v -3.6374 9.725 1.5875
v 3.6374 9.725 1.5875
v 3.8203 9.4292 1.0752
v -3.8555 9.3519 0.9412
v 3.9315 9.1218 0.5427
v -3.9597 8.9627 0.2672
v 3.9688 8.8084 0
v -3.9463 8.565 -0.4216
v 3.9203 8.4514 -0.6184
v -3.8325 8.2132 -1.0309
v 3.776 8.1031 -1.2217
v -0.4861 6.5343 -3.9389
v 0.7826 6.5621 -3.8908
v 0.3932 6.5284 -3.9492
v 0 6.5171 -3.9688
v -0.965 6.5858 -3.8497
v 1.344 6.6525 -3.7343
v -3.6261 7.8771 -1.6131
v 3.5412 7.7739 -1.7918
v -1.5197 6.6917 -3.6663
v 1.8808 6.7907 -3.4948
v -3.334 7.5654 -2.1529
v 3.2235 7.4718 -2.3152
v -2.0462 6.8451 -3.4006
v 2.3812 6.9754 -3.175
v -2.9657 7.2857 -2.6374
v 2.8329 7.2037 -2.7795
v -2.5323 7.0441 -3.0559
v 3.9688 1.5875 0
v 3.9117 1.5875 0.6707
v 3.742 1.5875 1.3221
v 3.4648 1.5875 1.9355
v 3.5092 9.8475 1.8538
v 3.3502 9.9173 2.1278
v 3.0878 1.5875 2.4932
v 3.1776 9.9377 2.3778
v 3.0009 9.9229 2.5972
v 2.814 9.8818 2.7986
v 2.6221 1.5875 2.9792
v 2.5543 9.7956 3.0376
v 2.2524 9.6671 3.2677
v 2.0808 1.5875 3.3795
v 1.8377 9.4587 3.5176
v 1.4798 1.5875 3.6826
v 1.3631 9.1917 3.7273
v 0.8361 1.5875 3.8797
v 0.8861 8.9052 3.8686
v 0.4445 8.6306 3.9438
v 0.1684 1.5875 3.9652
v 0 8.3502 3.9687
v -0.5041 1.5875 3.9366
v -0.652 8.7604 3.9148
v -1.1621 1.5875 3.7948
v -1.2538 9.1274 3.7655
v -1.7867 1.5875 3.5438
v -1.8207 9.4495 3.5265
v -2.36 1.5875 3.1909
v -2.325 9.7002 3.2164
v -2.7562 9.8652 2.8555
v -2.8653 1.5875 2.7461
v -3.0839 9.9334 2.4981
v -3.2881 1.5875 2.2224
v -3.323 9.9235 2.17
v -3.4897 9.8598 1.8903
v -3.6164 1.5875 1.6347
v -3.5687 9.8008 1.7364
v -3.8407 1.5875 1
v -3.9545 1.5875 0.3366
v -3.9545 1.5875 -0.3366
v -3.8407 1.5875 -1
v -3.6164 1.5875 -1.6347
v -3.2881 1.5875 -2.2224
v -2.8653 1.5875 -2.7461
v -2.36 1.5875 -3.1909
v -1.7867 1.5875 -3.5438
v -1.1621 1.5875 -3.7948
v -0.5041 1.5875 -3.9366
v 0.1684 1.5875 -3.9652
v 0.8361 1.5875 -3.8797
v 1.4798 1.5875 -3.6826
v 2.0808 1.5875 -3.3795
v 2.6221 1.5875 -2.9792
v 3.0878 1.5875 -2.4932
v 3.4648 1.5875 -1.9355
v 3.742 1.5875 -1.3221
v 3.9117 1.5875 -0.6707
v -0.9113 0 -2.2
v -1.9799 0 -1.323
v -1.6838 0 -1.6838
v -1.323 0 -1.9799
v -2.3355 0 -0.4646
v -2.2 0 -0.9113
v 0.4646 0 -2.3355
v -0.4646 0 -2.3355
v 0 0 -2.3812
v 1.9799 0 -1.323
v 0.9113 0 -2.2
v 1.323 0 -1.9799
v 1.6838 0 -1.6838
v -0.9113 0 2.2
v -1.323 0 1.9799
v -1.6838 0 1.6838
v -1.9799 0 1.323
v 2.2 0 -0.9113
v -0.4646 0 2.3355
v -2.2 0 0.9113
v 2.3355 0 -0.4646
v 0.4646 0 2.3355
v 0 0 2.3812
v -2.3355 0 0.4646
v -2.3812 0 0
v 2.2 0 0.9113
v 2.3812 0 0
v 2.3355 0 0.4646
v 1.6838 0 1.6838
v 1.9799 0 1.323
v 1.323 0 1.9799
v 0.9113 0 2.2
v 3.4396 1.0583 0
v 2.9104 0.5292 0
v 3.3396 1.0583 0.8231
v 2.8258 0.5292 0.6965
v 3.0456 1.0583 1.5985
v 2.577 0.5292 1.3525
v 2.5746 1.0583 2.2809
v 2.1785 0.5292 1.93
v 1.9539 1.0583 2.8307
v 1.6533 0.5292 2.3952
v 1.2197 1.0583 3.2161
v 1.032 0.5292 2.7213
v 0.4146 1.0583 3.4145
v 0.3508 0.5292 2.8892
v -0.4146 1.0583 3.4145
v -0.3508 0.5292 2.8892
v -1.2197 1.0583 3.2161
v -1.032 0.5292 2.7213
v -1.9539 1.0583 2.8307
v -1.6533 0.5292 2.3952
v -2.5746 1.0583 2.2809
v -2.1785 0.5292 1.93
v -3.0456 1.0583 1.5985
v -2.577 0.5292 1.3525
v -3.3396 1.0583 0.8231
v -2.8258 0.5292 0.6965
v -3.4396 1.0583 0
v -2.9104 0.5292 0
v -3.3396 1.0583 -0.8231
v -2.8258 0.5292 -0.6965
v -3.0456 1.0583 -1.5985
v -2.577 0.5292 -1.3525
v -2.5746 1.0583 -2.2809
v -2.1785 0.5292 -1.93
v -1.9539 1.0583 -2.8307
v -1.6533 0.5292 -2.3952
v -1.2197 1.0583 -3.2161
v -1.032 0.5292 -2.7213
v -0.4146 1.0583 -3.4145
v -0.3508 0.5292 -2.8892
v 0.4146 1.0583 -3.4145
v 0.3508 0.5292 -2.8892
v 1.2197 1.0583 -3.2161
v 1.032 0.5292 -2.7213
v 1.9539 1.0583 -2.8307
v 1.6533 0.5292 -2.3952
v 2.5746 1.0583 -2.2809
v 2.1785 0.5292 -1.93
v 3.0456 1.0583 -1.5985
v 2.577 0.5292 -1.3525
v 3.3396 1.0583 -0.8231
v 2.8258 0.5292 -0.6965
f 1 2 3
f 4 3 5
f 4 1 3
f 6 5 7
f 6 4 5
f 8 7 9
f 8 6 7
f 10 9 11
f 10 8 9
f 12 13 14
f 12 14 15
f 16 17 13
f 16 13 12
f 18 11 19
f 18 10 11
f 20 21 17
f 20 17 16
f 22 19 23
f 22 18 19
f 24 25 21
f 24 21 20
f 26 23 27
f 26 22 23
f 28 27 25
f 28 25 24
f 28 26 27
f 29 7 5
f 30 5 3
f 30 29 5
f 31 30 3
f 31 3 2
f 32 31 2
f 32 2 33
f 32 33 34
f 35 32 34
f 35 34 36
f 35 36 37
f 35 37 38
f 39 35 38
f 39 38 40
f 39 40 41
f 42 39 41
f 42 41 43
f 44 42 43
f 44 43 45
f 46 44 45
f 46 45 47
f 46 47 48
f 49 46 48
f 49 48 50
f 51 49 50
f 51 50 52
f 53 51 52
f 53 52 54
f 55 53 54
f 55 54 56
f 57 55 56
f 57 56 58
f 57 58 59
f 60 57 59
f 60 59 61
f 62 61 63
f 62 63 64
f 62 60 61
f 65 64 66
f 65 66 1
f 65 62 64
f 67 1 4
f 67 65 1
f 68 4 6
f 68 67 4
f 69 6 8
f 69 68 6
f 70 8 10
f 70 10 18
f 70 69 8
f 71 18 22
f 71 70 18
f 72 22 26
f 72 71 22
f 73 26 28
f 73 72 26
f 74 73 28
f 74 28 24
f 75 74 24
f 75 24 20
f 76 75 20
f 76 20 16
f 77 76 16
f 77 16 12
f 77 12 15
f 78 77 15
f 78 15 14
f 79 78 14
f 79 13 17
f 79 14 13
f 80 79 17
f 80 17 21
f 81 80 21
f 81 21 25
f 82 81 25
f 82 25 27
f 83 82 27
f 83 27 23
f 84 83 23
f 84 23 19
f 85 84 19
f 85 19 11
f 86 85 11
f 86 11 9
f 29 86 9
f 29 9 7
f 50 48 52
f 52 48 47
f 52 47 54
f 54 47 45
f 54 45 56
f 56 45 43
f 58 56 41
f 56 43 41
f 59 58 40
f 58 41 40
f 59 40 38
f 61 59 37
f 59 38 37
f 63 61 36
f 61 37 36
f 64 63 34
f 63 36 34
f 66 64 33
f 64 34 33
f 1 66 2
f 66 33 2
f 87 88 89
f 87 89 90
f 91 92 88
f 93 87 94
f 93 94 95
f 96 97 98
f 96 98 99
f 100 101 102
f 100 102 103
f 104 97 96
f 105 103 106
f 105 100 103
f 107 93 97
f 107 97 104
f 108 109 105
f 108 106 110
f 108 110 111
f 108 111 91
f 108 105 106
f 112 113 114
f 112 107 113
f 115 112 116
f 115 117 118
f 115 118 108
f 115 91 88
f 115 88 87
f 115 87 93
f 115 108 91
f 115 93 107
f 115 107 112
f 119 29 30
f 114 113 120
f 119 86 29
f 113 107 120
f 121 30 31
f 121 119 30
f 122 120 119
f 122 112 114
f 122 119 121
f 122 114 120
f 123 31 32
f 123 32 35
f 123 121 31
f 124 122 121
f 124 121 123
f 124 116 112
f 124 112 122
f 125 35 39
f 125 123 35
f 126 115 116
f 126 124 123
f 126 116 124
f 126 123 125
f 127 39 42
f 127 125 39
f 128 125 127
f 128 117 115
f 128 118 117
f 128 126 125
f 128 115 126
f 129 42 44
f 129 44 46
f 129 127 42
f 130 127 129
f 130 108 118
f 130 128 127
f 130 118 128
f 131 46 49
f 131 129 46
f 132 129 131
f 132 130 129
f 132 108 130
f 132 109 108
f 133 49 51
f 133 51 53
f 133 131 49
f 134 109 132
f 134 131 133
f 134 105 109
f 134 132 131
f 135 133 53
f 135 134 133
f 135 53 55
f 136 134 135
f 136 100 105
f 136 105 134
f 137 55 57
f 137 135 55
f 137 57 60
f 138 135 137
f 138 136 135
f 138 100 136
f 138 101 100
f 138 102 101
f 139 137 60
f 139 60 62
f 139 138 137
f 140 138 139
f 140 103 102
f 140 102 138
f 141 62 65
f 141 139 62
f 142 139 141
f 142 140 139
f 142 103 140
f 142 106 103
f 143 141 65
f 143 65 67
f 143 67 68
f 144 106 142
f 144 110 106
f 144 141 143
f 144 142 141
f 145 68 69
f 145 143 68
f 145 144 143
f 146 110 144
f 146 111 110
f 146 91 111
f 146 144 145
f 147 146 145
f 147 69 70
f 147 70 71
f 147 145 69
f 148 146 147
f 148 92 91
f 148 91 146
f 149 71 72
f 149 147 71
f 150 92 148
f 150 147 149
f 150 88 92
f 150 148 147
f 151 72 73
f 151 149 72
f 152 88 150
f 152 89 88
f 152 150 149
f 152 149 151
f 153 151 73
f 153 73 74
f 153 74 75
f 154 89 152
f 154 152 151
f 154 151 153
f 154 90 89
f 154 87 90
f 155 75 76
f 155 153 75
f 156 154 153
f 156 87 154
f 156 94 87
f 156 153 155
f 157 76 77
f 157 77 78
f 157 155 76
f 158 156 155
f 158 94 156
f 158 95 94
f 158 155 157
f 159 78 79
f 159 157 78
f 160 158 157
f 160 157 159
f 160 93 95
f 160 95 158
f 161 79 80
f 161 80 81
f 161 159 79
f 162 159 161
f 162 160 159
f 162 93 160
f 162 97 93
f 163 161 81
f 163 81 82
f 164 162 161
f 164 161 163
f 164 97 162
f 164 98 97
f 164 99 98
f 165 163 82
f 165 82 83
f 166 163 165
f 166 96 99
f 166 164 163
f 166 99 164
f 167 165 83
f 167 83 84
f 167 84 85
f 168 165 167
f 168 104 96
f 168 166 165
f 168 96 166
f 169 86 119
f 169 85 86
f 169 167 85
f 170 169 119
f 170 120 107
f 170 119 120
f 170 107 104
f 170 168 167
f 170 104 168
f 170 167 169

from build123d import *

# Parameters (mm, degrees)
F0_R          = 3.96875
F1_DEPTH      = 11.0998
F3_DEPTH      = 25.4
F3_DEPTH_BACK = 25.4
F4_SIZE2      = 1.5875
F4_SIZE       = 1.5875
F7_DEPTH      = 25.4
F7_DEPTH_BACK = 25.4


with BuildPart() as f1:
    # F0 (on Front) → F1 (new body)
    with BuildSketch(Plane.XZ):
        Circle(F0_R)
    extrude(amount=-F1_DEPTH)

    # F2 (on Right) → F3 (cut, two sides)
    with BuildSketch(Plane.YZ) as f3_sk:
        Polygon((11.0998, -21.43125), (11.0998, 3.96875), (-3.5648968374, -21.43125), align=None)
    extrude(amount=-F3_DEPTH, mode=Mode.SUBTRACT)
    extrude(f3_sk.sketch, amount=F3_DEPTH_BACK, mode=Mode.SUBTRACT)

    # F4
    f4_edges = [f1.edges().sort_by_distance(p)[0] for p in [
        (-3.96875, 0, 0),
    ]]
    chamfer(f4_edges, length=F4_SIZE, length2=F4_SIZE2)

    # F6 (on offset) → F7 (cut, two sides)
    with BuildSketch(Plane.YZ) as f7_sk:
        with BuildLine():
            ThreePointArc((8.350169343, 3.96875), (9.7249846715, 3.175), (9.7249846715, 1.5875))
            Line((9.7249846715, 1.5875), (11.0998, 3.96875))
            Line((11.0998, 3.96875), (8.350169343, 3.96875))
        make_face()
    extrude(amount=-F7_DEPTH, mode=Mode.SUBTRACT)
    extrude(f7_sk.sketch, amount=F7_DEPTH_BACK, mode=Mode.SUBTRACT)


solid = f1.part
